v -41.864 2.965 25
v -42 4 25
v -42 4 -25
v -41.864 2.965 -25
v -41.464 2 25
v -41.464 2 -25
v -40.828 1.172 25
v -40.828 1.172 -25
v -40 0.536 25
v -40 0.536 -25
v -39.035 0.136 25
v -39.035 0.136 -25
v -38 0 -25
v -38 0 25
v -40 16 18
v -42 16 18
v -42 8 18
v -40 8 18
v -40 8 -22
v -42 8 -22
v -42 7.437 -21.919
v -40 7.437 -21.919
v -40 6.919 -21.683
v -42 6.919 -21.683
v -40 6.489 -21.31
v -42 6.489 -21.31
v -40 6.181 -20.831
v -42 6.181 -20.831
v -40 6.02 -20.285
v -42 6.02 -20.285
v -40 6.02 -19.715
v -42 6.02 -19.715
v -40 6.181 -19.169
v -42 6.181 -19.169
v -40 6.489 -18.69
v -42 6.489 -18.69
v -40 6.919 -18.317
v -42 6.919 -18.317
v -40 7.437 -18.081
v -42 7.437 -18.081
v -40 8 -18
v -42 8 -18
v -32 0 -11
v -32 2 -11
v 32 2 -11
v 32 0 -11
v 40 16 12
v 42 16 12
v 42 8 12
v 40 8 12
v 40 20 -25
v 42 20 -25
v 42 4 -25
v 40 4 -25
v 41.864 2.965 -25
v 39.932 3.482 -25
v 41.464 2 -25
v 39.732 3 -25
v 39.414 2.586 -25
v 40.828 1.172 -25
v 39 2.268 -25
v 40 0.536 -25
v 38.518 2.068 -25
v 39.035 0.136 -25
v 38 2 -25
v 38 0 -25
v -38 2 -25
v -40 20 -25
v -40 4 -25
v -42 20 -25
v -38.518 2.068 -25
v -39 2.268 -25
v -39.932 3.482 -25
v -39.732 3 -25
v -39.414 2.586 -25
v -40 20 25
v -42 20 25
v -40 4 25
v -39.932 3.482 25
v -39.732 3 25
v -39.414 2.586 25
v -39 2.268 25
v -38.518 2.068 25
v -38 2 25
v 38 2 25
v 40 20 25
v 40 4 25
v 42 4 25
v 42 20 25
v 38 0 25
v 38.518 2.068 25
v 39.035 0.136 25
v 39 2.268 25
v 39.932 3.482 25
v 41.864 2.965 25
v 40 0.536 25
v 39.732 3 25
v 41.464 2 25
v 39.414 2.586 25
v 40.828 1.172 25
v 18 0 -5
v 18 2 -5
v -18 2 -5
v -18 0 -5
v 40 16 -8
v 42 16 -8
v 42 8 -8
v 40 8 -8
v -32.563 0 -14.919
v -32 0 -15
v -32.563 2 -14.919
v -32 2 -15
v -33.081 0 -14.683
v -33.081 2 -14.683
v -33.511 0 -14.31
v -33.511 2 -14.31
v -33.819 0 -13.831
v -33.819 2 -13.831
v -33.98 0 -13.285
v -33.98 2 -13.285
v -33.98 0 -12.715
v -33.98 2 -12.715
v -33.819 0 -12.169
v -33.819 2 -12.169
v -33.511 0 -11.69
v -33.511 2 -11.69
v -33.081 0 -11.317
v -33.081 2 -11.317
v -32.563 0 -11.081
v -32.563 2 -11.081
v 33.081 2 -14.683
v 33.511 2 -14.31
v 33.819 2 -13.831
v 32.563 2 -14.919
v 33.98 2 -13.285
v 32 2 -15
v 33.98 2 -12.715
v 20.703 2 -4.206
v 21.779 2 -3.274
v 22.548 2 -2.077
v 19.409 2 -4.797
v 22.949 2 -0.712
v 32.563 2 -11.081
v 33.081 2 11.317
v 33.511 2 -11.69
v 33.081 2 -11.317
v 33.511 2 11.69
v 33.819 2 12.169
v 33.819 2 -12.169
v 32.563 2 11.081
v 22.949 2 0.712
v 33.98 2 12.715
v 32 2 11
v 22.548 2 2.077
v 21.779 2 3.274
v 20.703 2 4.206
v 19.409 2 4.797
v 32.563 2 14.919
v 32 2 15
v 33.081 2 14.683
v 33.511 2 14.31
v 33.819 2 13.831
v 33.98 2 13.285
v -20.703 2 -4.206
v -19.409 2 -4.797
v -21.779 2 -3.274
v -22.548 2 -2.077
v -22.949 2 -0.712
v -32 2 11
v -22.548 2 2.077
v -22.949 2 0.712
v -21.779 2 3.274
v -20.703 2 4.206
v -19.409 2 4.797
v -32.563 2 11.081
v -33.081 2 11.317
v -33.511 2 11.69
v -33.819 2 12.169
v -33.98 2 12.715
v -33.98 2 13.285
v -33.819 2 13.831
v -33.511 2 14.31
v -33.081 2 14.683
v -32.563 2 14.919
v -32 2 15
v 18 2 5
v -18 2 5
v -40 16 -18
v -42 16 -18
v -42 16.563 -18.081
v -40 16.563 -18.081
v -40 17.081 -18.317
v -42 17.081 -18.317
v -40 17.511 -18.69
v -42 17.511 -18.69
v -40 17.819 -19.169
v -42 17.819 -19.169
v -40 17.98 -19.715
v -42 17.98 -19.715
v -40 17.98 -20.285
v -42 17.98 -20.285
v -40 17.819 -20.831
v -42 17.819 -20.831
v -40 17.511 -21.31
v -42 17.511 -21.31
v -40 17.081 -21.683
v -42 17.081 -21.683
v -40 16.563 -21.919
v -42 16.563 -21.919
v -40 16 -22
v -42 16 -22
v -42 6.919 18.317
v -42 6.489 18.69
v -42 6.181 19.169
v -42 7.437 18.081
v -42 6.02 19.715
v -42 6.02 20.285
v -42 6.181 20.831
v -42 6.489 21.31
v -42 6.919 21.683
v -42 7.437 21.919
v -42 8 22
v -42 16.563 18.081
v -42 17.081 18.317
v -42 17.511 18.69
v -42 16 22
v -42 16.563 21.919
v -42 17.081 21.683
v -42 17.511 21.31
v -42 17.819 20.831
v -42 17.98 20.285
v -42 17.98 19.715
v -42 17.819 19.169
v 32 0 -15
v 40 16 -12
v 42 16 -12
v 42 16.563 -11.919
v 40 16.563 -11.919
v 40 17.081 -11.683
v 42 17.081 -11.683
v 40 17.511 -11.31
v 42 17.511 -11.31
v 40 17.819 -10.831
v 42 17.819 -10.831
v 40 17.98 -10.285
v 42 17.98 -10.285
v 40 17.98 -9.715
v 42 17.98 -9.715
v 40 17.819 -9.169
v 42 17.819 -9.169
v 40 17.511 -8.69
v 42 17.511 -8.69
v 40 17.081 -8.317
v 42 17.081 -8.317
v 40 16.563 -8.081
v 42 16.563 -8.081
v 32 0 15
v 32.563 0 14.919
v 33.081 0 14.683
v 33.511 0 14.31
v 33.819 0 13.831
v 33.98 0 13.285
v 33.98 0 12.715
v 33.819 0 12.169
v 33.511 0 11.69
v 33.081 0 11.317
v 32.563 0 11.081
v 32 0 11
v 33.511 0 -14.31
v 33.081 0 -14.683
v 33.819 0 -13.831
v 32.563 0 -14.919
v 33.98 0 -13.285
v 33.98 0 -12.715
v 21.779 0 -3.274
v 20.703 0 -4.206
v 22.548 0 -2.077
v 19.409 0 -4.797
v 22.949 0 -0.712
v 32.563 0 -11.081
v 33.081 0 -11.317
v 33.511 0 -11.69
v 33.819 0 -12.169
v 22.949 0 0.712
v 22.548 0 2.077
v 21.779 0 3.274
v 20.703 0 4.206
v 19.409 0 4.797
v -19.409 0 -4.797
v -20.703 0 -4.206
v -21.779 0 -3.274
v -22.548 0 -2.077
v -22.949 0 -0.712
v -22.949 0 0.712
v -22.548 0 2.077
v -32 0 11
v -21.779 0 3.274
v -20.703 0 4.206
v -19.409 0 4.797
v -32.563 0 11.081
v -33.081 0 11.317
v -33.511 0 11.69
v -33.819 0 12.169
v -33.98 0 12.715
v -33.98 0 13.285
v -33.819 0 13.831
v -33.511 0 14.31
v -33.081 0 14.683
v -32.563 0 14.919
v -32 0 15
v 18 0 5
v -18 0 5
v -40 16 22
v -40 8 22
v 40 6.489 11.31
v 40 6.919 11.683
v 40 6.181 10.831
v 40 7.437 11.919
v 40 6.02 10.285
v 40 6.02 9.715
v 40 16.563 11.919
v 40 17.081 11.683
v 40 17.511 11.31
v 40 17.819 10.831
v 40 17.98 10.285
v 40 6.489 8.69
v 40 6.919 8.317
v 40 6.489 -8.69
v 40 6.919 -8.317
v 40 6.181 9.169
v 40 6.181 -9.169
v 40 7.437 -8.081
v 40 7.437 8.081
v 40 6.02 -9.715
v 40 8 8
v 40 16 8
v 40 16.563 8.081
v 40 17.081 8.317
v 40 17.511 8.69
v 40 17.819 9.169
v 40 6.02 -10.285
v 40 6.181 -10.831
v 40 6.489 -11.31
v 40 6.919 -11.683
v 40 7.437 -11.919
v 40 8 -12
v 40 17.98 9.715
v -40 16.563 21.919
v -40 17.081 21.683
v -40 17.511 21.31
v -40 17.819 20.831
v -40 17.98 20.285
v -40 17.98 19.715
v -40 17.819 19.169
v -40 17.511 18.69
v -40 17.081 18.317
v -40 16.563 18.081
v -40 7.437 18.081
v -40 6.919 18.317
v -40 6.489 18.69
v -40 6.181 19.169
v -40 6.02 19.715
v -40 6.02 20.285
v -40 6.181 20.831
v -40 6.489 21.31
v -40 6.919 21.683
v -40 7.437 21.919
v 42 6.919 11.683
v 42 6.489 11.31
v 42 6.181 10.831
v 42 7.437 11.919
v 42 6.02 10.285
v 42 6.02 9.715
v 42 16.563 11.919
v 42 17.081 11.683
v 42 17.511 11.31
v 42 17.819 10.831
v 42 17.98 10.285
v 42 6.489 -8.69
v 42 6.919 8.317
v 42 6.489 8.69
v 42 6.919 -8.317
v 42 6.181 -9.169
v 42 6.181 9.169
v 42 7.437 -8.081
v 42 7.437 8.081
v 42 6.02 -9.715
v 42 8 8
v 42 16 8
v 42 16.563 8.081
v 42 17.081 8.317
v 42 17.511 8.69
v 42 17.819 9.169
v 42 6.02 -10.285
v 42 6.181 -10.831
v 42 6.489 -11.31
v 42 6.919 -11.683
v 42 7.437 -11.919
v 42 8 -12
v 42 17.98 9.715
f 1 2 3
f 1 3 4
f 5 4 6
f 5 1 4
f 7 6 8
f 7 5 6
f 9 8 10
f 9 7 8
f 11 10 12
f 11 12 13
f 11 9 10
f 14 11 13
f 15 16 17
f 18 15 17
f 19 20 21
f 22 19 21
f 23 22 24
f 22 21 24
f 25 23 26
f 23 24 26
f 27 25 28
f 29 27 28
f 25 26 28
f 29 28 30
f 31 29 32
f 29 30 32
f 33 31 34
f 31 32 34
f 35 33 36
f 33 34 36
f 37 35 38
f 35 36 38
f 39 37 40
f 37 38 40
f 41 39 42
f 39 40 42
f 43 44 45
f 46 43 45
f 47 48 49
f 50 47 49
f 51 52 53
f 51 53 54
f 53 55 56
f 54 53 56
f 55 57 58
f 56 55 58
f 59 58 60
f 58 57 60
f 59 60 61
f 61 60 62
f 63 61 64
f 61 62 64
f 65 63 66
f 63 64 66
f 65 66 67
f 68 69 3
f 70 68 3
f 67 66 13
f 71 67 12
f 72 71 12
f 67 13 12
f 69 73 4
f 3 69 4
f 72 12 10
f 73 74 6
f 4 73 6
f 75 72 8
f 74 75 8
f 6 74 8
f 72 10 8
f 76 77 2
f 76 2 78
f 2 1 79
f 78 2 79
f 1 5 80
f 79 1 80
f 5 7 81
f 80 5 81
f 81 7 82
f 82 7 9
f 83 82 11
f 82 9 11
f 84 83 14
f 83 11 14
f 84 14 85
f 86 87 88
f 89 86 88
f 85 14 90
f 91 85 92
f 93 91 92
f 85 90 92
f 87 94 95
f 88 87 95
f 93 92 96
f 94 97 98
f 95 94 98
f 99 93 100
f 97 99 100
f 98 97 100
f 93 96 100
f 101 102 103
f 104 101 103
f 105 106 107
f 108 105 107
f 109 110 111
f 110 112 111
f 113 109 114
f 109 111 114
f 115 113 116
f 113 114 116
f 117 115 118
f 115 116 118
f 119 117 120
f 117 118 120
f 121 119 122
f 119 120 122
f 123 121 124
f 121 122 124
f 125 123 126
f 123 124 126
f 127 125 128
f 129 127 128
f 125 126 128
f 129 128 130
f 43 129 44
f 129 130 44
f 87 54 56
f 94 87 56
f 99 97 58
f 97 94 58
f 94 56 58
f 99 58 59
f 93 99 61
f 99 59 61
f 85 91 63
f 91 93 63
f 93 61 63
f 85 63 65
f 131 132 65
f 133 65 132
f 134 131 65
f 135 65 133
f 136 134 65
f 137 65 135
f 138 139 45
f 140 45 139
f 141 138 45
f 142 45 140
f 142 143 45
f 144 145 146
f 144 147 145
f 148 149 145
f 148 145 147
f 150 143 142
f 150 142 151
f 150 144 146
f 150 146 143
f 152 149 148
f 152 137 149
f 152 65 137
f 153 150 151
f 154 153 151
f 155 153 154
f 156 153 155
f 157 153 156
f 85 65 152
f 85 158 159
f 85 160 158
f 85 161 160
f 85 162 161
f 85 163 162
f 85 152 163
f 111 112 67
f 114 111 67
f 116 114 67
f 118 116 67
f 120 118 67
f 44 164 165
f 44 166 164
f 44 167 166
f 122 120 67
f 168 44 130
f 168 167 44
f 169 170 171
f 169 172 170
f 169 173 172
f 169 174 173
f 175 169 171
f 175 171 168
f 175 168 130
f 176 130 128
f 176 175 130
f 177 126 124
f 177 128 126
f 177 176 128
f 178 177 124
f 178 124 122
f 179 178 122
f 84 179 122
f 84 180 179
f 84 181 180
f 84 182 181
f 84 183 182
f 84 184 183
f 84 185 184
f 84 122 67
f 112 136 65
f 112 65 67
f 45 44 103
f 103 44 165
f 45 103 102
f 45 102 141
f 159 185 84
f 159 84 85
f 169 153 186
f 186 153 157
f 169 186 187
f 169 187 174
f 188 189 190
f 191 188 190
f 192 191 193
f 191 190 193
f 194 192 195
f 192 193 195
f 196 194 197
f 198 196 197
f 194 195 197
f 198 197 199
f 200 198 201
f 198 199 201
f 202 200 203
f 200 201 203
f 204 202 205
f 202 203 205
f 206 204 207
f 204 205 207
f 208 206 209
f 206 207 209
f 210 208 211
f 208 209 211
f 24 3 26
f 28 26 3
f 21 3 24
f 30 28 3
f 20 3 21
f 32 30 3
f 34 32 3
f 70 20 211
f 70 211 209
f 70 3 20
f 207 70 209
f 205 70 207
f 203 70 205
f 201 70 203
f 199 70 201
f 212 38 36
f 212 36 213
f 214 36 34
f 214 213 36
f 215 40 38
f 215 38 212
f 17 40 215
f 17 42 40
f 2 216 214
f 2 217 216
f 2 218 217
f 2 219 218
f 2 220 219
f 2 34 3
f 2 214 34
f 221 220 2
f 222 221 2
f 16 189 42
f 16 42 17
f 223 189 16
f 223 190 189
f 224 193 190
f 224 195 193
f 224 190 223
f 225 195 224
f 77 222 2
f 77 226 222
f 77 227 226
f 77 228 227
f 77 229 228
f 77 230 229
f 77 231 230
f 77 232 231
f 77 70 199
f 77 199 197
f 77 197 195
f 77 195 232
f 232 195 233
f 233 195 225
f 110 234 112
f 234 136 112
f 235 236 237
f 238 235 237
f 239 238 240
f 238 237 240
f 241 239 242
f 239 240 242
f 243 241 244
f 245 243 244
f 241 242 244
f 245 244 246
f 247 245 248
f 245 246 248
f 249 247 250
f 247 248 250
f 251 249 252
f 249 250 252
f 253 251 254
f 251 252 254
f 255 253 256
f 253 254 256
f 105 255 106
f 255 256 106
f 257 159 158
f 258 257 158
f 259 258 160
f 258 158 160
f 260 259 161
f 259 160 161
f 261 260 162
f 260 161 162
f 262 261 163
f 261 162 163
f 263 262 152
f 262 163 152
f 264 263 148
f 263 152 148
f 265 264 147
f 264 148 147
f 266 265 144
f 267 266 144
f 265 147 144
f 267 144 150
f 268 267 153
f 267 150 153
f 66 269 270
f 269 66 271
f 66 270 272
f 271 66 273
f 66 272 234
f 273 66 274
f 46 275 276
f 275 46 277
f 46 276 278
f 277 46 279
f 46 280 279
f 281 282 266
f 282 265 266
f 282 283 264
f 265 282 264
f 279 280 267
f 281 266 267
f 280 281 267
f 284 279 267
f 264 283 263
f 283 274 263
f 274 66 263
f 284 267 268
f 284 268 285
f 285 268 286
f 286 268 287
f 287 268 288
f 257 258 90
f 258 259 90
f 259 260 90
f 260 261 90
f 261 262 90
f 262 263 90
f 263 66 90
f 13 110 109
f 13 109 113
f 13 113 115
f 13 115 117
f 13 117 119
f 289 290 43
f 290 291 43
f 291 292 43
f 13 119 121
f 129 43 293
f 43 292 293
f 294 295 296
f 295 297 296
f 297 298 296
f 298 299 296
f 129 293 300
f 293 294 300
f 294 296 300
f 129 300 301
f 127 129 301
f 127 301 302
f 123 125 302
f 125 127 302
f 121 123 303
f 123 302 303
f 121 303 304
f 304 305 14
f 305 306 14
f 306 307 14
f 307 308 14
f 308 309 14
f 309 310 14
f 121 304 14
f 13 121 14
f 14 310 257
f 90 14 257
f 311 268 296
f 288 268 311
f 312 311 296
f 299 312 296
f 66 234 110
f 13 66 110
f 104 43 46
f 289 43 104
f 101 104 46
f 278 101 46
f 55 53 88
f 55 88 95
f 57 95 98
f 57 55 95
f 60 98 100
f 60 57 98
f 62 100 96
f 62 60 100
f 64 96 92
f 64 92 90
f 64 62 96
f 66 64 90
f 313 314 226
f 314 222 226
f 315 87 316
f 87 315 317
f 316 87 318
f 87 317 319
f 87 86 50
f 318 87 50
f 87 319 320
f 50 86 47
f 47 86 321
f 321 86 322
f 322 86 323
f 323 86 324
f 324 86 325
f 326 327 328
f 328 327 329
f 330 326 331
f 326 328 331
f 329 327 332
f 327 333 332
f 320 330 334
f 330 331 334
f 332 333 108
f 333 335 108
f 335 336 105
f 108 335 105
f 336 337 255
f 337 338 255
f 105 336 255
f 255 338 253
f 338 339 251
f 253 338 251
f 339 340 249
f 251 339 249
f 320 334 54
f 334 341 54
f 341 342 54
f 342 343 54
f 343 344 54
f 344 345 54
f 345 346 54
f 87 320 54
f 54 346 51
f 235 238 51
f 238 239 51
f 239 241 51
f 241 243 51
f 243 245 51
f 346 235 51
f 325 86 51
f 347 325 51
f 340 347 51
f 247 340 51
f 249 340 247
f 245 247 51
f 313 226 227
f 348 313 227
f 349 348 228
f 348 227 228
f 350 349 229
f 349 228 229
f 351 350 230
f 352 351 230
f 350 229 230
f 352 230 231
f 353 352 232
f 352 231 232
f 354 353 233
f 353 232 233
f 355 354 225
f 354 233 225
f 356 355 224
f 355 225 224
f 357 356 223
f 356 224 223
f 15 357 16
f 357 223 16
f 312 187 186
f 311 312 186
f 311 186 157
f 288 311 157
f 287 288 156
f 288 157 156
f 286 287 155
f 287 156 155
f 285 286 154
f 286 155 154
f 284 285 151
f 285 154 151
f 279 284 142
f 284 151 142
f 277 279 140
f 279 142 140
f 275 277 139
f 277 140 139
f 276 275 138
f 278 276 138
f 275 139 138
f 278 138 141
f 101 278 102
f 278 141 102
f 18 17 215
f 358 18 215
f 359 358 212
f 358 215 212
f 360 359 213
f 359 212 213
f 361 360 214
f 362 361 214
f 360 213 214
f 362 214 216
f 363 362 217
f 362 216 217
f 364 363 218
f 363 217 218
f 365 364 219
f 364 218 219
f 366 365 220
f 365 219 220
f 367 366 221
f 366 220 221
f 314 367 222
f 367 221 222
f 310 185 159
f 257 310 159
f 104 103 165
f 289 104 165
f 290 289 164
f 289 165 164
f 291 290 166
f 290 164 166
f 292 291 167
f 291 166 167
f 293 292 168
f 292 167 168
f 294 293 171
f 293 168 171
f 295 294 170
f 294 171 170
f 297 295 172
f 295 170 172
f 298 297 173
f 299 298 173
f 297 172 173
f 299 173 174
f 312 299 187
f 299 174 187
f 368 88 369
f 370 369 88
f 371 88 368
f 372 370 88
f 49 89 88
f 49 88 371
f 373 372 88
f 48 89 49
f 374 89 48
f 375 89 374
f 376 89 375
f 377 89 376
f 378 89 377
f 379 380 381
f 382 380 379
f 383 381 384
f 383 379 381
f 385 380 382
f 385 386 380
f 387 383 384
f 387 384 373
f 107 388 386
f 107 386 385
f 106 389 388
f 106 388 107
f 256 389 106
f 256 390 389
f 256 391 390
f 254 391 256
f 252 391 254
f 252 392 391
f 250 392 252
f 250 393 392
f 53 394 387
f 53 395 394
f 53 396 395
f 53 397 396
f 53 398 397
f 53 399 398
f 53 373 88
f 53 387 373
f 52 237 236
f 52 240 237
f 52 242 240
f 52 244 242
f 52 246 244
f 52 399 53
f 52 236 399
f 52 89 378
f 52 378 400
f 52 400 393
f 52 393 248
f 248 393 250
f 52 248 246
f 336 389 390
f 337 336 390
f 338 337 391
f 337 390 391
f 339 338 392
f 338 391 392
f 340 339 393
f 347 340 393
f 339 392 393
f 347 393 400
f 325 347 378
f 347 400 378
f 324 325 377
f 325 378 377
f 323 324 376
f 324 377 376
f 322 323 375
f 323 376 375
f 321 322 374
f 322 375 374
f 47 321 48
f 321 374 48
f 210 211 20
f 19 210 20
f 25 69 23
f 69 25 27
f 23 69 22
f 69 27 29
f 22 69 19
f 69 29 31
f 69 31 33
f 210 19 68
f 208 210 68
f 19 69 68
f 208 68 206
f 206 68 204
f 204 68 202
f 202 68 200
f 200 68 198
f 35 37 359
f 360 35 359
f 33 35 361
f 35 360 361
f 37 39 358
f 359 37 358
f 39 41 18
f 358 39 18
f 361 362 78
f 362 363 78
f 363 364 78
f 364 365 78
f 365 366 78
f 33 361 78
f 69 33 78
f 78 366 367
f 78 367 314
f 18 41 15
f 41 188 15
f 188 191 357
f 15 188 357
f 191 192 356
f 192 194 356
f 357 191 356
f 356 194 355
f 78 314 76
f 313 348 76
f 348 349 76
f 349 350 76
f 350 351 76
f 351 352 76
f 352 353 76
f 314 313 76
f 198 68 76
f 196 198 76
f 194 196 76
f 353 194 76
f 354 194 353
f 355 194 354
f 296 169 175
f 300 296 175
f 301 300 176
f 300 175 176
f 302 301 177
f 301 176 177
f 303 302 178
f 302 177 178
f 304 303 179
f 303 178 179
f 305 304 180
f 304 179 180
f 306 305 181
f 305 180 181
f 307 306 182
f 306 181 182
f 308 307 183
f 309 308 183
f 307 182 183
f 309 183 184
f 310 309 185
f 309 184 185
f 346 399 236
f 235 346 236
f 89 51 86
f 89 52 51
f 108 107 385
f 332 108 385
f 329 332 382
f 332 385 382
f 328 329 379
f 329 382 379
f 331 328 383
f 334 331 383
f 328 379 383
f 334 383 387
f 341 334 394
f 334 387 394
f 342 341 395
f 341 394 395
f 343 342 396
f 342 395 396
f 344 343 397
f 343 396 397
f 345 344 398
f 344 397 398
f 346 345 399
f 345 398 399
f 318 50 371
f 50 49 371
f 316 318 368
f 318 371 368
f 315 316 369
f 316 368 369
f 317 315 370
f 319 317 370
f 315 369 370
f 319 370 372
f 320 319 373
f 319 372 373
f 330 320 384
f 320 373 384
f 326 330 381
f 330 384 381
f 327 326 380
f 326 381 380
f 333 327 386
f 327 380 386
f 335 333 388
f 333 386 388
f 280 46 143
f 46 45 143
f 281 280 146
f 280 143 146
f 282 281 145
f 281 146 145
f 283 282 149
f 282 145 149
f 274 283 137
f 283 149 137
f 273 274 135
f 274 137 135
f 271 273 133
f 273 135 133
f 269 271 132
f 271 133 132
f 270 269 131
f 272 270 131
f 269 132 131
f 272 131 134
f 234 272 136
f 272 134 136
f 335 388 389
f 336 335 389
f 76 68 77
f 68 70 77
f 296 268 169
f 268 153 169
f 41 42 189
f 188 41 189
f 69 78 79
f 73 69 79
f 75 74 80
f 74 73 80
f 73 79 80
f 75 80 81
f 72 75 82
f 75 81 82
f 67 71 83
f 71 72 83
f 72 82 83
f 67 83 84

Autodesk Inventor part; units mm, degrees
ref_plane "YZ Plane" through (0, 0, 0) normal (1, 0, 0) x (0, 1, 0)
ref_plane "XZ Plane" through (0, 0, 0) normal (0, 1, 0) x (-1, 0, 0)
ref_plane "XY Plane" through (0, 0, 0) normal (0, 0, 1) x (1, 0, 0)
sketch "スケッチ1" plane through (0, 0, 0) normal (0, 1, 0) x (-1, 0, 0)
  line L0 (-42, -25) -> (42, -25)
  line L1 (42, -25) -> (42, 25)
  line L2 (42, 25) -> (-42, 25)
  line L3 (-42, 25) -> (-42, -25)
  line L4 (-42, -25) -> (42, 25) construction
  line L5 (42, -25) -> (-42, 25) construction
  point P0 (0, 0)
  dimension "d0" = 84
  dimension "d1" = 50
extrude "プレート1" add sketch "スケッチ1" along normal blind 2
sketch "スケッチ2" plane through (-42, 0, -25) normal (-1, 0, 0) x (0, 0, 1)
  line L0 (0, 0) -> (50, 0)
  line L1 (50, 0) -> (0, 0)
  line L2 (0, 0) -> (0, 20)
  line L3 (0, 20) -> (50, 20)
  line L4 (50, 20) -> (50, 0)
  point P0 (25, 0)
  dimension "d3" = 20
sheet face with bend "面2" sketch "スケッチ2" thickness 2 toward (1, 0, 0) bend radius 2
bend "曲げ1"
sketch "スケッチ3" plane through (42, 0, 25) normal (1, 0, 0) x (0, 0, -1)
  line L0 (0, 0) -> (50, 0)
  line L1 (50, 0) -> (50, 20)
  line L2 (50, 20) -> (0, 20)
  line L3 (0, 20) -> (0, 0)
  point P0 (25, 0)
  point P1 (50, 0)
  dimension "d9" = 20
sheet face with bend "面3" sketch "スケッチ3" thickness 2 toward (-1, 0, 0) bend radius 2
bend "曲げ2"
sketch "スケッチ4" plane through (0, 2, 0) normal (0, 1, 0) x (1, 0, 0)
  line L0 (-32, -15) -> (32, -15)
  arc A0 (32, -15) -> (32, -11) centre (32, -13) ccw
  line L1 (32, -11) -> (-32, -11)
  arc A1 (-32, -11) -> (-32, -15) centre (-32, -13) ccw
  line L2 (-18, -5) -> (18, -5)
  arc A2 (18, -5) -> (18, 5) centre (18, 0) ccw
  line L3 (18, 5) -> (-18, 5)
  arc A3 (-18, 5) -> (-18, -5) centre (-18, 0) ccw
  line L4 (-32, 11) -> (32, 11)
  arc A4 (32, 11) -> (32, 15) centre (32, 13) ccw
  line L5 (32, 15) -> (-32, 15)
  arc A5 (-32, 15) -> (-32, 11) centre (-32, 13) ccw
  line L6 (38, -25) -> (-38, -25) projected
  line L7 (38, -25) -> (38, 25) projected
  line L8 (-38, 25) -> (-38, -25) projected
  line L9 (-38, 25) -> (38, 25) projected
  point P0 (0, 0)
  dimension "d15" = 2
  dimension "d16" = 2
  dimension "d17" = 12
  dimension "d18" = 6
  dimension "d19" = 6
  dimension "d20" = 6
  dimension "d21" = 6
  dimension "d22" = 12
  dimension "d23" = 20
  dimension "d24" = 20
  dimension "d25" = 10
extrude "押し出し1" cut sketch "スケッチ4" against normal blind 10 contours A1 L1 A0 L0 | A3 L3 A2 L2 | A5 L5 A4 L4
sketch "スケッチ5" plane through (-42, 0, -25) normal (-1, 0, 0) x (0, 0, 1)
  line L0 (3, 16) -> (3, 8)
  arc A0 (3, 8) -> (7, 8) centre (5, 8) ccw
  line L1 (7, 8) -> (7, 16)
  arc A1 (7, 16) -> (3, 16) centre (5, 16) ccw
  line L2 (43, 16) -> (43, 8)
  arc A2 (43, 8) -> (47, 8) centre (45, 8) ccw
  line L3 (47, 8) -> (47, 16)
  arc A3 (47, 16) -> (43, 16) centre (45, 16) ccw
  line L4 (50, 4) -> (50, 20) projected
  line L5 (0, 20) -> (0, 4) projected
  line L6 (50, 20) -> (0, 20) projected
  line L7 (50, 4) -> (0, 4) projected
  point P0 (25, 0)
  dimension "d28" = 2
  dimension "d29" = 2
  dimension "d30" = 5
  dimension "d31" = 5
  dimension "d32" = 4
  dimension "d33" = 4
  dimension "d34" = 4
  dimension "d35" = 4
extrude "押し出し2" cut sketch "スケッチ5" against normal blind 10 contours A1 L1 A0 L0 | A3 L3 A2 L2
sketch "スケッチ6" plane through (42, 0, 25) normal (1, 0, 0) x (0, 0, -1)
  line L0 (13, 16) -> (13, 8)
  arc A0 (13, 8) -> (17, 8) centre (15, 8) ccw
  line L1 (17, 8) -> (17, 16)
  arc A1 (17, 16) -> (13, 16) centre (15, 16) ccw
  line L2 (33, 16) -> (33, 8)
  arc A2 (33, 8) -> (37, 8) centre (35, 8) ccw
  line L3 (37, 8) -> (37, 16)
  arc A3 (37, 16) -> (33, 16) centre (35, 16) ccw
  line L4 (50, 4) -> (50, 20) projected
  line L5 (0, 20) -> (0, 4) projected
  line L6 (50, 20) -> (0, 20) projected
  line L7 (50, 4) -> (0, 4) projected
  point P0 (25, 0)
  dimension "d38" = 2
  dimension "d39" = 2
  dimension "d40" = 15
  dimension "d41" = 15
  dimension "d42" = 4
  dimension "d43" = 4
extrude "押し出し3" cut sketch "スケッチ6" against normal blind 10 contours A1 L1 A0 L0 | A3 L3 A2 L2
equation "\"d2\" = Thickness"
equation "\"d4\" = BendRadius"
equation "\"d5\" = BendReliefWidth"
equation "\"d7\" = MinimumRemnant"
equation "\"d6\" = BendReliefDepth"
equation "\"d8\" = TransitionRadius"
equation "\"d10\" = BendRadius"
equation "\"d11\" = BendReliefWidth"
equation "\"d13\" = MinimumRemnant"
equation "\"d12\" = BendReliefDepth"
equation "\"d14\" = TransitionRadius"
equation "\"BendRadius\" = Thickness"
equation "\"BendReliefWidth\" = Thickness"
equation "\"BendReliefDepth\" = 0.5 * Thickness"
equation "\"CornerReliefSize\" = 4 * Thickness"
equation "\"MinimumRemnant\" = 2 * Thickness"
equation "\"TransitionRadius\" = BendRadius"
equation "\"JacobiRadiusSize\" = BendRadius"
equation "\"GapSize\" = Thickness"
equation "\"Thickness\" = 2"
properties part number "palmrest_cup" material "アルミニウム 6061"
